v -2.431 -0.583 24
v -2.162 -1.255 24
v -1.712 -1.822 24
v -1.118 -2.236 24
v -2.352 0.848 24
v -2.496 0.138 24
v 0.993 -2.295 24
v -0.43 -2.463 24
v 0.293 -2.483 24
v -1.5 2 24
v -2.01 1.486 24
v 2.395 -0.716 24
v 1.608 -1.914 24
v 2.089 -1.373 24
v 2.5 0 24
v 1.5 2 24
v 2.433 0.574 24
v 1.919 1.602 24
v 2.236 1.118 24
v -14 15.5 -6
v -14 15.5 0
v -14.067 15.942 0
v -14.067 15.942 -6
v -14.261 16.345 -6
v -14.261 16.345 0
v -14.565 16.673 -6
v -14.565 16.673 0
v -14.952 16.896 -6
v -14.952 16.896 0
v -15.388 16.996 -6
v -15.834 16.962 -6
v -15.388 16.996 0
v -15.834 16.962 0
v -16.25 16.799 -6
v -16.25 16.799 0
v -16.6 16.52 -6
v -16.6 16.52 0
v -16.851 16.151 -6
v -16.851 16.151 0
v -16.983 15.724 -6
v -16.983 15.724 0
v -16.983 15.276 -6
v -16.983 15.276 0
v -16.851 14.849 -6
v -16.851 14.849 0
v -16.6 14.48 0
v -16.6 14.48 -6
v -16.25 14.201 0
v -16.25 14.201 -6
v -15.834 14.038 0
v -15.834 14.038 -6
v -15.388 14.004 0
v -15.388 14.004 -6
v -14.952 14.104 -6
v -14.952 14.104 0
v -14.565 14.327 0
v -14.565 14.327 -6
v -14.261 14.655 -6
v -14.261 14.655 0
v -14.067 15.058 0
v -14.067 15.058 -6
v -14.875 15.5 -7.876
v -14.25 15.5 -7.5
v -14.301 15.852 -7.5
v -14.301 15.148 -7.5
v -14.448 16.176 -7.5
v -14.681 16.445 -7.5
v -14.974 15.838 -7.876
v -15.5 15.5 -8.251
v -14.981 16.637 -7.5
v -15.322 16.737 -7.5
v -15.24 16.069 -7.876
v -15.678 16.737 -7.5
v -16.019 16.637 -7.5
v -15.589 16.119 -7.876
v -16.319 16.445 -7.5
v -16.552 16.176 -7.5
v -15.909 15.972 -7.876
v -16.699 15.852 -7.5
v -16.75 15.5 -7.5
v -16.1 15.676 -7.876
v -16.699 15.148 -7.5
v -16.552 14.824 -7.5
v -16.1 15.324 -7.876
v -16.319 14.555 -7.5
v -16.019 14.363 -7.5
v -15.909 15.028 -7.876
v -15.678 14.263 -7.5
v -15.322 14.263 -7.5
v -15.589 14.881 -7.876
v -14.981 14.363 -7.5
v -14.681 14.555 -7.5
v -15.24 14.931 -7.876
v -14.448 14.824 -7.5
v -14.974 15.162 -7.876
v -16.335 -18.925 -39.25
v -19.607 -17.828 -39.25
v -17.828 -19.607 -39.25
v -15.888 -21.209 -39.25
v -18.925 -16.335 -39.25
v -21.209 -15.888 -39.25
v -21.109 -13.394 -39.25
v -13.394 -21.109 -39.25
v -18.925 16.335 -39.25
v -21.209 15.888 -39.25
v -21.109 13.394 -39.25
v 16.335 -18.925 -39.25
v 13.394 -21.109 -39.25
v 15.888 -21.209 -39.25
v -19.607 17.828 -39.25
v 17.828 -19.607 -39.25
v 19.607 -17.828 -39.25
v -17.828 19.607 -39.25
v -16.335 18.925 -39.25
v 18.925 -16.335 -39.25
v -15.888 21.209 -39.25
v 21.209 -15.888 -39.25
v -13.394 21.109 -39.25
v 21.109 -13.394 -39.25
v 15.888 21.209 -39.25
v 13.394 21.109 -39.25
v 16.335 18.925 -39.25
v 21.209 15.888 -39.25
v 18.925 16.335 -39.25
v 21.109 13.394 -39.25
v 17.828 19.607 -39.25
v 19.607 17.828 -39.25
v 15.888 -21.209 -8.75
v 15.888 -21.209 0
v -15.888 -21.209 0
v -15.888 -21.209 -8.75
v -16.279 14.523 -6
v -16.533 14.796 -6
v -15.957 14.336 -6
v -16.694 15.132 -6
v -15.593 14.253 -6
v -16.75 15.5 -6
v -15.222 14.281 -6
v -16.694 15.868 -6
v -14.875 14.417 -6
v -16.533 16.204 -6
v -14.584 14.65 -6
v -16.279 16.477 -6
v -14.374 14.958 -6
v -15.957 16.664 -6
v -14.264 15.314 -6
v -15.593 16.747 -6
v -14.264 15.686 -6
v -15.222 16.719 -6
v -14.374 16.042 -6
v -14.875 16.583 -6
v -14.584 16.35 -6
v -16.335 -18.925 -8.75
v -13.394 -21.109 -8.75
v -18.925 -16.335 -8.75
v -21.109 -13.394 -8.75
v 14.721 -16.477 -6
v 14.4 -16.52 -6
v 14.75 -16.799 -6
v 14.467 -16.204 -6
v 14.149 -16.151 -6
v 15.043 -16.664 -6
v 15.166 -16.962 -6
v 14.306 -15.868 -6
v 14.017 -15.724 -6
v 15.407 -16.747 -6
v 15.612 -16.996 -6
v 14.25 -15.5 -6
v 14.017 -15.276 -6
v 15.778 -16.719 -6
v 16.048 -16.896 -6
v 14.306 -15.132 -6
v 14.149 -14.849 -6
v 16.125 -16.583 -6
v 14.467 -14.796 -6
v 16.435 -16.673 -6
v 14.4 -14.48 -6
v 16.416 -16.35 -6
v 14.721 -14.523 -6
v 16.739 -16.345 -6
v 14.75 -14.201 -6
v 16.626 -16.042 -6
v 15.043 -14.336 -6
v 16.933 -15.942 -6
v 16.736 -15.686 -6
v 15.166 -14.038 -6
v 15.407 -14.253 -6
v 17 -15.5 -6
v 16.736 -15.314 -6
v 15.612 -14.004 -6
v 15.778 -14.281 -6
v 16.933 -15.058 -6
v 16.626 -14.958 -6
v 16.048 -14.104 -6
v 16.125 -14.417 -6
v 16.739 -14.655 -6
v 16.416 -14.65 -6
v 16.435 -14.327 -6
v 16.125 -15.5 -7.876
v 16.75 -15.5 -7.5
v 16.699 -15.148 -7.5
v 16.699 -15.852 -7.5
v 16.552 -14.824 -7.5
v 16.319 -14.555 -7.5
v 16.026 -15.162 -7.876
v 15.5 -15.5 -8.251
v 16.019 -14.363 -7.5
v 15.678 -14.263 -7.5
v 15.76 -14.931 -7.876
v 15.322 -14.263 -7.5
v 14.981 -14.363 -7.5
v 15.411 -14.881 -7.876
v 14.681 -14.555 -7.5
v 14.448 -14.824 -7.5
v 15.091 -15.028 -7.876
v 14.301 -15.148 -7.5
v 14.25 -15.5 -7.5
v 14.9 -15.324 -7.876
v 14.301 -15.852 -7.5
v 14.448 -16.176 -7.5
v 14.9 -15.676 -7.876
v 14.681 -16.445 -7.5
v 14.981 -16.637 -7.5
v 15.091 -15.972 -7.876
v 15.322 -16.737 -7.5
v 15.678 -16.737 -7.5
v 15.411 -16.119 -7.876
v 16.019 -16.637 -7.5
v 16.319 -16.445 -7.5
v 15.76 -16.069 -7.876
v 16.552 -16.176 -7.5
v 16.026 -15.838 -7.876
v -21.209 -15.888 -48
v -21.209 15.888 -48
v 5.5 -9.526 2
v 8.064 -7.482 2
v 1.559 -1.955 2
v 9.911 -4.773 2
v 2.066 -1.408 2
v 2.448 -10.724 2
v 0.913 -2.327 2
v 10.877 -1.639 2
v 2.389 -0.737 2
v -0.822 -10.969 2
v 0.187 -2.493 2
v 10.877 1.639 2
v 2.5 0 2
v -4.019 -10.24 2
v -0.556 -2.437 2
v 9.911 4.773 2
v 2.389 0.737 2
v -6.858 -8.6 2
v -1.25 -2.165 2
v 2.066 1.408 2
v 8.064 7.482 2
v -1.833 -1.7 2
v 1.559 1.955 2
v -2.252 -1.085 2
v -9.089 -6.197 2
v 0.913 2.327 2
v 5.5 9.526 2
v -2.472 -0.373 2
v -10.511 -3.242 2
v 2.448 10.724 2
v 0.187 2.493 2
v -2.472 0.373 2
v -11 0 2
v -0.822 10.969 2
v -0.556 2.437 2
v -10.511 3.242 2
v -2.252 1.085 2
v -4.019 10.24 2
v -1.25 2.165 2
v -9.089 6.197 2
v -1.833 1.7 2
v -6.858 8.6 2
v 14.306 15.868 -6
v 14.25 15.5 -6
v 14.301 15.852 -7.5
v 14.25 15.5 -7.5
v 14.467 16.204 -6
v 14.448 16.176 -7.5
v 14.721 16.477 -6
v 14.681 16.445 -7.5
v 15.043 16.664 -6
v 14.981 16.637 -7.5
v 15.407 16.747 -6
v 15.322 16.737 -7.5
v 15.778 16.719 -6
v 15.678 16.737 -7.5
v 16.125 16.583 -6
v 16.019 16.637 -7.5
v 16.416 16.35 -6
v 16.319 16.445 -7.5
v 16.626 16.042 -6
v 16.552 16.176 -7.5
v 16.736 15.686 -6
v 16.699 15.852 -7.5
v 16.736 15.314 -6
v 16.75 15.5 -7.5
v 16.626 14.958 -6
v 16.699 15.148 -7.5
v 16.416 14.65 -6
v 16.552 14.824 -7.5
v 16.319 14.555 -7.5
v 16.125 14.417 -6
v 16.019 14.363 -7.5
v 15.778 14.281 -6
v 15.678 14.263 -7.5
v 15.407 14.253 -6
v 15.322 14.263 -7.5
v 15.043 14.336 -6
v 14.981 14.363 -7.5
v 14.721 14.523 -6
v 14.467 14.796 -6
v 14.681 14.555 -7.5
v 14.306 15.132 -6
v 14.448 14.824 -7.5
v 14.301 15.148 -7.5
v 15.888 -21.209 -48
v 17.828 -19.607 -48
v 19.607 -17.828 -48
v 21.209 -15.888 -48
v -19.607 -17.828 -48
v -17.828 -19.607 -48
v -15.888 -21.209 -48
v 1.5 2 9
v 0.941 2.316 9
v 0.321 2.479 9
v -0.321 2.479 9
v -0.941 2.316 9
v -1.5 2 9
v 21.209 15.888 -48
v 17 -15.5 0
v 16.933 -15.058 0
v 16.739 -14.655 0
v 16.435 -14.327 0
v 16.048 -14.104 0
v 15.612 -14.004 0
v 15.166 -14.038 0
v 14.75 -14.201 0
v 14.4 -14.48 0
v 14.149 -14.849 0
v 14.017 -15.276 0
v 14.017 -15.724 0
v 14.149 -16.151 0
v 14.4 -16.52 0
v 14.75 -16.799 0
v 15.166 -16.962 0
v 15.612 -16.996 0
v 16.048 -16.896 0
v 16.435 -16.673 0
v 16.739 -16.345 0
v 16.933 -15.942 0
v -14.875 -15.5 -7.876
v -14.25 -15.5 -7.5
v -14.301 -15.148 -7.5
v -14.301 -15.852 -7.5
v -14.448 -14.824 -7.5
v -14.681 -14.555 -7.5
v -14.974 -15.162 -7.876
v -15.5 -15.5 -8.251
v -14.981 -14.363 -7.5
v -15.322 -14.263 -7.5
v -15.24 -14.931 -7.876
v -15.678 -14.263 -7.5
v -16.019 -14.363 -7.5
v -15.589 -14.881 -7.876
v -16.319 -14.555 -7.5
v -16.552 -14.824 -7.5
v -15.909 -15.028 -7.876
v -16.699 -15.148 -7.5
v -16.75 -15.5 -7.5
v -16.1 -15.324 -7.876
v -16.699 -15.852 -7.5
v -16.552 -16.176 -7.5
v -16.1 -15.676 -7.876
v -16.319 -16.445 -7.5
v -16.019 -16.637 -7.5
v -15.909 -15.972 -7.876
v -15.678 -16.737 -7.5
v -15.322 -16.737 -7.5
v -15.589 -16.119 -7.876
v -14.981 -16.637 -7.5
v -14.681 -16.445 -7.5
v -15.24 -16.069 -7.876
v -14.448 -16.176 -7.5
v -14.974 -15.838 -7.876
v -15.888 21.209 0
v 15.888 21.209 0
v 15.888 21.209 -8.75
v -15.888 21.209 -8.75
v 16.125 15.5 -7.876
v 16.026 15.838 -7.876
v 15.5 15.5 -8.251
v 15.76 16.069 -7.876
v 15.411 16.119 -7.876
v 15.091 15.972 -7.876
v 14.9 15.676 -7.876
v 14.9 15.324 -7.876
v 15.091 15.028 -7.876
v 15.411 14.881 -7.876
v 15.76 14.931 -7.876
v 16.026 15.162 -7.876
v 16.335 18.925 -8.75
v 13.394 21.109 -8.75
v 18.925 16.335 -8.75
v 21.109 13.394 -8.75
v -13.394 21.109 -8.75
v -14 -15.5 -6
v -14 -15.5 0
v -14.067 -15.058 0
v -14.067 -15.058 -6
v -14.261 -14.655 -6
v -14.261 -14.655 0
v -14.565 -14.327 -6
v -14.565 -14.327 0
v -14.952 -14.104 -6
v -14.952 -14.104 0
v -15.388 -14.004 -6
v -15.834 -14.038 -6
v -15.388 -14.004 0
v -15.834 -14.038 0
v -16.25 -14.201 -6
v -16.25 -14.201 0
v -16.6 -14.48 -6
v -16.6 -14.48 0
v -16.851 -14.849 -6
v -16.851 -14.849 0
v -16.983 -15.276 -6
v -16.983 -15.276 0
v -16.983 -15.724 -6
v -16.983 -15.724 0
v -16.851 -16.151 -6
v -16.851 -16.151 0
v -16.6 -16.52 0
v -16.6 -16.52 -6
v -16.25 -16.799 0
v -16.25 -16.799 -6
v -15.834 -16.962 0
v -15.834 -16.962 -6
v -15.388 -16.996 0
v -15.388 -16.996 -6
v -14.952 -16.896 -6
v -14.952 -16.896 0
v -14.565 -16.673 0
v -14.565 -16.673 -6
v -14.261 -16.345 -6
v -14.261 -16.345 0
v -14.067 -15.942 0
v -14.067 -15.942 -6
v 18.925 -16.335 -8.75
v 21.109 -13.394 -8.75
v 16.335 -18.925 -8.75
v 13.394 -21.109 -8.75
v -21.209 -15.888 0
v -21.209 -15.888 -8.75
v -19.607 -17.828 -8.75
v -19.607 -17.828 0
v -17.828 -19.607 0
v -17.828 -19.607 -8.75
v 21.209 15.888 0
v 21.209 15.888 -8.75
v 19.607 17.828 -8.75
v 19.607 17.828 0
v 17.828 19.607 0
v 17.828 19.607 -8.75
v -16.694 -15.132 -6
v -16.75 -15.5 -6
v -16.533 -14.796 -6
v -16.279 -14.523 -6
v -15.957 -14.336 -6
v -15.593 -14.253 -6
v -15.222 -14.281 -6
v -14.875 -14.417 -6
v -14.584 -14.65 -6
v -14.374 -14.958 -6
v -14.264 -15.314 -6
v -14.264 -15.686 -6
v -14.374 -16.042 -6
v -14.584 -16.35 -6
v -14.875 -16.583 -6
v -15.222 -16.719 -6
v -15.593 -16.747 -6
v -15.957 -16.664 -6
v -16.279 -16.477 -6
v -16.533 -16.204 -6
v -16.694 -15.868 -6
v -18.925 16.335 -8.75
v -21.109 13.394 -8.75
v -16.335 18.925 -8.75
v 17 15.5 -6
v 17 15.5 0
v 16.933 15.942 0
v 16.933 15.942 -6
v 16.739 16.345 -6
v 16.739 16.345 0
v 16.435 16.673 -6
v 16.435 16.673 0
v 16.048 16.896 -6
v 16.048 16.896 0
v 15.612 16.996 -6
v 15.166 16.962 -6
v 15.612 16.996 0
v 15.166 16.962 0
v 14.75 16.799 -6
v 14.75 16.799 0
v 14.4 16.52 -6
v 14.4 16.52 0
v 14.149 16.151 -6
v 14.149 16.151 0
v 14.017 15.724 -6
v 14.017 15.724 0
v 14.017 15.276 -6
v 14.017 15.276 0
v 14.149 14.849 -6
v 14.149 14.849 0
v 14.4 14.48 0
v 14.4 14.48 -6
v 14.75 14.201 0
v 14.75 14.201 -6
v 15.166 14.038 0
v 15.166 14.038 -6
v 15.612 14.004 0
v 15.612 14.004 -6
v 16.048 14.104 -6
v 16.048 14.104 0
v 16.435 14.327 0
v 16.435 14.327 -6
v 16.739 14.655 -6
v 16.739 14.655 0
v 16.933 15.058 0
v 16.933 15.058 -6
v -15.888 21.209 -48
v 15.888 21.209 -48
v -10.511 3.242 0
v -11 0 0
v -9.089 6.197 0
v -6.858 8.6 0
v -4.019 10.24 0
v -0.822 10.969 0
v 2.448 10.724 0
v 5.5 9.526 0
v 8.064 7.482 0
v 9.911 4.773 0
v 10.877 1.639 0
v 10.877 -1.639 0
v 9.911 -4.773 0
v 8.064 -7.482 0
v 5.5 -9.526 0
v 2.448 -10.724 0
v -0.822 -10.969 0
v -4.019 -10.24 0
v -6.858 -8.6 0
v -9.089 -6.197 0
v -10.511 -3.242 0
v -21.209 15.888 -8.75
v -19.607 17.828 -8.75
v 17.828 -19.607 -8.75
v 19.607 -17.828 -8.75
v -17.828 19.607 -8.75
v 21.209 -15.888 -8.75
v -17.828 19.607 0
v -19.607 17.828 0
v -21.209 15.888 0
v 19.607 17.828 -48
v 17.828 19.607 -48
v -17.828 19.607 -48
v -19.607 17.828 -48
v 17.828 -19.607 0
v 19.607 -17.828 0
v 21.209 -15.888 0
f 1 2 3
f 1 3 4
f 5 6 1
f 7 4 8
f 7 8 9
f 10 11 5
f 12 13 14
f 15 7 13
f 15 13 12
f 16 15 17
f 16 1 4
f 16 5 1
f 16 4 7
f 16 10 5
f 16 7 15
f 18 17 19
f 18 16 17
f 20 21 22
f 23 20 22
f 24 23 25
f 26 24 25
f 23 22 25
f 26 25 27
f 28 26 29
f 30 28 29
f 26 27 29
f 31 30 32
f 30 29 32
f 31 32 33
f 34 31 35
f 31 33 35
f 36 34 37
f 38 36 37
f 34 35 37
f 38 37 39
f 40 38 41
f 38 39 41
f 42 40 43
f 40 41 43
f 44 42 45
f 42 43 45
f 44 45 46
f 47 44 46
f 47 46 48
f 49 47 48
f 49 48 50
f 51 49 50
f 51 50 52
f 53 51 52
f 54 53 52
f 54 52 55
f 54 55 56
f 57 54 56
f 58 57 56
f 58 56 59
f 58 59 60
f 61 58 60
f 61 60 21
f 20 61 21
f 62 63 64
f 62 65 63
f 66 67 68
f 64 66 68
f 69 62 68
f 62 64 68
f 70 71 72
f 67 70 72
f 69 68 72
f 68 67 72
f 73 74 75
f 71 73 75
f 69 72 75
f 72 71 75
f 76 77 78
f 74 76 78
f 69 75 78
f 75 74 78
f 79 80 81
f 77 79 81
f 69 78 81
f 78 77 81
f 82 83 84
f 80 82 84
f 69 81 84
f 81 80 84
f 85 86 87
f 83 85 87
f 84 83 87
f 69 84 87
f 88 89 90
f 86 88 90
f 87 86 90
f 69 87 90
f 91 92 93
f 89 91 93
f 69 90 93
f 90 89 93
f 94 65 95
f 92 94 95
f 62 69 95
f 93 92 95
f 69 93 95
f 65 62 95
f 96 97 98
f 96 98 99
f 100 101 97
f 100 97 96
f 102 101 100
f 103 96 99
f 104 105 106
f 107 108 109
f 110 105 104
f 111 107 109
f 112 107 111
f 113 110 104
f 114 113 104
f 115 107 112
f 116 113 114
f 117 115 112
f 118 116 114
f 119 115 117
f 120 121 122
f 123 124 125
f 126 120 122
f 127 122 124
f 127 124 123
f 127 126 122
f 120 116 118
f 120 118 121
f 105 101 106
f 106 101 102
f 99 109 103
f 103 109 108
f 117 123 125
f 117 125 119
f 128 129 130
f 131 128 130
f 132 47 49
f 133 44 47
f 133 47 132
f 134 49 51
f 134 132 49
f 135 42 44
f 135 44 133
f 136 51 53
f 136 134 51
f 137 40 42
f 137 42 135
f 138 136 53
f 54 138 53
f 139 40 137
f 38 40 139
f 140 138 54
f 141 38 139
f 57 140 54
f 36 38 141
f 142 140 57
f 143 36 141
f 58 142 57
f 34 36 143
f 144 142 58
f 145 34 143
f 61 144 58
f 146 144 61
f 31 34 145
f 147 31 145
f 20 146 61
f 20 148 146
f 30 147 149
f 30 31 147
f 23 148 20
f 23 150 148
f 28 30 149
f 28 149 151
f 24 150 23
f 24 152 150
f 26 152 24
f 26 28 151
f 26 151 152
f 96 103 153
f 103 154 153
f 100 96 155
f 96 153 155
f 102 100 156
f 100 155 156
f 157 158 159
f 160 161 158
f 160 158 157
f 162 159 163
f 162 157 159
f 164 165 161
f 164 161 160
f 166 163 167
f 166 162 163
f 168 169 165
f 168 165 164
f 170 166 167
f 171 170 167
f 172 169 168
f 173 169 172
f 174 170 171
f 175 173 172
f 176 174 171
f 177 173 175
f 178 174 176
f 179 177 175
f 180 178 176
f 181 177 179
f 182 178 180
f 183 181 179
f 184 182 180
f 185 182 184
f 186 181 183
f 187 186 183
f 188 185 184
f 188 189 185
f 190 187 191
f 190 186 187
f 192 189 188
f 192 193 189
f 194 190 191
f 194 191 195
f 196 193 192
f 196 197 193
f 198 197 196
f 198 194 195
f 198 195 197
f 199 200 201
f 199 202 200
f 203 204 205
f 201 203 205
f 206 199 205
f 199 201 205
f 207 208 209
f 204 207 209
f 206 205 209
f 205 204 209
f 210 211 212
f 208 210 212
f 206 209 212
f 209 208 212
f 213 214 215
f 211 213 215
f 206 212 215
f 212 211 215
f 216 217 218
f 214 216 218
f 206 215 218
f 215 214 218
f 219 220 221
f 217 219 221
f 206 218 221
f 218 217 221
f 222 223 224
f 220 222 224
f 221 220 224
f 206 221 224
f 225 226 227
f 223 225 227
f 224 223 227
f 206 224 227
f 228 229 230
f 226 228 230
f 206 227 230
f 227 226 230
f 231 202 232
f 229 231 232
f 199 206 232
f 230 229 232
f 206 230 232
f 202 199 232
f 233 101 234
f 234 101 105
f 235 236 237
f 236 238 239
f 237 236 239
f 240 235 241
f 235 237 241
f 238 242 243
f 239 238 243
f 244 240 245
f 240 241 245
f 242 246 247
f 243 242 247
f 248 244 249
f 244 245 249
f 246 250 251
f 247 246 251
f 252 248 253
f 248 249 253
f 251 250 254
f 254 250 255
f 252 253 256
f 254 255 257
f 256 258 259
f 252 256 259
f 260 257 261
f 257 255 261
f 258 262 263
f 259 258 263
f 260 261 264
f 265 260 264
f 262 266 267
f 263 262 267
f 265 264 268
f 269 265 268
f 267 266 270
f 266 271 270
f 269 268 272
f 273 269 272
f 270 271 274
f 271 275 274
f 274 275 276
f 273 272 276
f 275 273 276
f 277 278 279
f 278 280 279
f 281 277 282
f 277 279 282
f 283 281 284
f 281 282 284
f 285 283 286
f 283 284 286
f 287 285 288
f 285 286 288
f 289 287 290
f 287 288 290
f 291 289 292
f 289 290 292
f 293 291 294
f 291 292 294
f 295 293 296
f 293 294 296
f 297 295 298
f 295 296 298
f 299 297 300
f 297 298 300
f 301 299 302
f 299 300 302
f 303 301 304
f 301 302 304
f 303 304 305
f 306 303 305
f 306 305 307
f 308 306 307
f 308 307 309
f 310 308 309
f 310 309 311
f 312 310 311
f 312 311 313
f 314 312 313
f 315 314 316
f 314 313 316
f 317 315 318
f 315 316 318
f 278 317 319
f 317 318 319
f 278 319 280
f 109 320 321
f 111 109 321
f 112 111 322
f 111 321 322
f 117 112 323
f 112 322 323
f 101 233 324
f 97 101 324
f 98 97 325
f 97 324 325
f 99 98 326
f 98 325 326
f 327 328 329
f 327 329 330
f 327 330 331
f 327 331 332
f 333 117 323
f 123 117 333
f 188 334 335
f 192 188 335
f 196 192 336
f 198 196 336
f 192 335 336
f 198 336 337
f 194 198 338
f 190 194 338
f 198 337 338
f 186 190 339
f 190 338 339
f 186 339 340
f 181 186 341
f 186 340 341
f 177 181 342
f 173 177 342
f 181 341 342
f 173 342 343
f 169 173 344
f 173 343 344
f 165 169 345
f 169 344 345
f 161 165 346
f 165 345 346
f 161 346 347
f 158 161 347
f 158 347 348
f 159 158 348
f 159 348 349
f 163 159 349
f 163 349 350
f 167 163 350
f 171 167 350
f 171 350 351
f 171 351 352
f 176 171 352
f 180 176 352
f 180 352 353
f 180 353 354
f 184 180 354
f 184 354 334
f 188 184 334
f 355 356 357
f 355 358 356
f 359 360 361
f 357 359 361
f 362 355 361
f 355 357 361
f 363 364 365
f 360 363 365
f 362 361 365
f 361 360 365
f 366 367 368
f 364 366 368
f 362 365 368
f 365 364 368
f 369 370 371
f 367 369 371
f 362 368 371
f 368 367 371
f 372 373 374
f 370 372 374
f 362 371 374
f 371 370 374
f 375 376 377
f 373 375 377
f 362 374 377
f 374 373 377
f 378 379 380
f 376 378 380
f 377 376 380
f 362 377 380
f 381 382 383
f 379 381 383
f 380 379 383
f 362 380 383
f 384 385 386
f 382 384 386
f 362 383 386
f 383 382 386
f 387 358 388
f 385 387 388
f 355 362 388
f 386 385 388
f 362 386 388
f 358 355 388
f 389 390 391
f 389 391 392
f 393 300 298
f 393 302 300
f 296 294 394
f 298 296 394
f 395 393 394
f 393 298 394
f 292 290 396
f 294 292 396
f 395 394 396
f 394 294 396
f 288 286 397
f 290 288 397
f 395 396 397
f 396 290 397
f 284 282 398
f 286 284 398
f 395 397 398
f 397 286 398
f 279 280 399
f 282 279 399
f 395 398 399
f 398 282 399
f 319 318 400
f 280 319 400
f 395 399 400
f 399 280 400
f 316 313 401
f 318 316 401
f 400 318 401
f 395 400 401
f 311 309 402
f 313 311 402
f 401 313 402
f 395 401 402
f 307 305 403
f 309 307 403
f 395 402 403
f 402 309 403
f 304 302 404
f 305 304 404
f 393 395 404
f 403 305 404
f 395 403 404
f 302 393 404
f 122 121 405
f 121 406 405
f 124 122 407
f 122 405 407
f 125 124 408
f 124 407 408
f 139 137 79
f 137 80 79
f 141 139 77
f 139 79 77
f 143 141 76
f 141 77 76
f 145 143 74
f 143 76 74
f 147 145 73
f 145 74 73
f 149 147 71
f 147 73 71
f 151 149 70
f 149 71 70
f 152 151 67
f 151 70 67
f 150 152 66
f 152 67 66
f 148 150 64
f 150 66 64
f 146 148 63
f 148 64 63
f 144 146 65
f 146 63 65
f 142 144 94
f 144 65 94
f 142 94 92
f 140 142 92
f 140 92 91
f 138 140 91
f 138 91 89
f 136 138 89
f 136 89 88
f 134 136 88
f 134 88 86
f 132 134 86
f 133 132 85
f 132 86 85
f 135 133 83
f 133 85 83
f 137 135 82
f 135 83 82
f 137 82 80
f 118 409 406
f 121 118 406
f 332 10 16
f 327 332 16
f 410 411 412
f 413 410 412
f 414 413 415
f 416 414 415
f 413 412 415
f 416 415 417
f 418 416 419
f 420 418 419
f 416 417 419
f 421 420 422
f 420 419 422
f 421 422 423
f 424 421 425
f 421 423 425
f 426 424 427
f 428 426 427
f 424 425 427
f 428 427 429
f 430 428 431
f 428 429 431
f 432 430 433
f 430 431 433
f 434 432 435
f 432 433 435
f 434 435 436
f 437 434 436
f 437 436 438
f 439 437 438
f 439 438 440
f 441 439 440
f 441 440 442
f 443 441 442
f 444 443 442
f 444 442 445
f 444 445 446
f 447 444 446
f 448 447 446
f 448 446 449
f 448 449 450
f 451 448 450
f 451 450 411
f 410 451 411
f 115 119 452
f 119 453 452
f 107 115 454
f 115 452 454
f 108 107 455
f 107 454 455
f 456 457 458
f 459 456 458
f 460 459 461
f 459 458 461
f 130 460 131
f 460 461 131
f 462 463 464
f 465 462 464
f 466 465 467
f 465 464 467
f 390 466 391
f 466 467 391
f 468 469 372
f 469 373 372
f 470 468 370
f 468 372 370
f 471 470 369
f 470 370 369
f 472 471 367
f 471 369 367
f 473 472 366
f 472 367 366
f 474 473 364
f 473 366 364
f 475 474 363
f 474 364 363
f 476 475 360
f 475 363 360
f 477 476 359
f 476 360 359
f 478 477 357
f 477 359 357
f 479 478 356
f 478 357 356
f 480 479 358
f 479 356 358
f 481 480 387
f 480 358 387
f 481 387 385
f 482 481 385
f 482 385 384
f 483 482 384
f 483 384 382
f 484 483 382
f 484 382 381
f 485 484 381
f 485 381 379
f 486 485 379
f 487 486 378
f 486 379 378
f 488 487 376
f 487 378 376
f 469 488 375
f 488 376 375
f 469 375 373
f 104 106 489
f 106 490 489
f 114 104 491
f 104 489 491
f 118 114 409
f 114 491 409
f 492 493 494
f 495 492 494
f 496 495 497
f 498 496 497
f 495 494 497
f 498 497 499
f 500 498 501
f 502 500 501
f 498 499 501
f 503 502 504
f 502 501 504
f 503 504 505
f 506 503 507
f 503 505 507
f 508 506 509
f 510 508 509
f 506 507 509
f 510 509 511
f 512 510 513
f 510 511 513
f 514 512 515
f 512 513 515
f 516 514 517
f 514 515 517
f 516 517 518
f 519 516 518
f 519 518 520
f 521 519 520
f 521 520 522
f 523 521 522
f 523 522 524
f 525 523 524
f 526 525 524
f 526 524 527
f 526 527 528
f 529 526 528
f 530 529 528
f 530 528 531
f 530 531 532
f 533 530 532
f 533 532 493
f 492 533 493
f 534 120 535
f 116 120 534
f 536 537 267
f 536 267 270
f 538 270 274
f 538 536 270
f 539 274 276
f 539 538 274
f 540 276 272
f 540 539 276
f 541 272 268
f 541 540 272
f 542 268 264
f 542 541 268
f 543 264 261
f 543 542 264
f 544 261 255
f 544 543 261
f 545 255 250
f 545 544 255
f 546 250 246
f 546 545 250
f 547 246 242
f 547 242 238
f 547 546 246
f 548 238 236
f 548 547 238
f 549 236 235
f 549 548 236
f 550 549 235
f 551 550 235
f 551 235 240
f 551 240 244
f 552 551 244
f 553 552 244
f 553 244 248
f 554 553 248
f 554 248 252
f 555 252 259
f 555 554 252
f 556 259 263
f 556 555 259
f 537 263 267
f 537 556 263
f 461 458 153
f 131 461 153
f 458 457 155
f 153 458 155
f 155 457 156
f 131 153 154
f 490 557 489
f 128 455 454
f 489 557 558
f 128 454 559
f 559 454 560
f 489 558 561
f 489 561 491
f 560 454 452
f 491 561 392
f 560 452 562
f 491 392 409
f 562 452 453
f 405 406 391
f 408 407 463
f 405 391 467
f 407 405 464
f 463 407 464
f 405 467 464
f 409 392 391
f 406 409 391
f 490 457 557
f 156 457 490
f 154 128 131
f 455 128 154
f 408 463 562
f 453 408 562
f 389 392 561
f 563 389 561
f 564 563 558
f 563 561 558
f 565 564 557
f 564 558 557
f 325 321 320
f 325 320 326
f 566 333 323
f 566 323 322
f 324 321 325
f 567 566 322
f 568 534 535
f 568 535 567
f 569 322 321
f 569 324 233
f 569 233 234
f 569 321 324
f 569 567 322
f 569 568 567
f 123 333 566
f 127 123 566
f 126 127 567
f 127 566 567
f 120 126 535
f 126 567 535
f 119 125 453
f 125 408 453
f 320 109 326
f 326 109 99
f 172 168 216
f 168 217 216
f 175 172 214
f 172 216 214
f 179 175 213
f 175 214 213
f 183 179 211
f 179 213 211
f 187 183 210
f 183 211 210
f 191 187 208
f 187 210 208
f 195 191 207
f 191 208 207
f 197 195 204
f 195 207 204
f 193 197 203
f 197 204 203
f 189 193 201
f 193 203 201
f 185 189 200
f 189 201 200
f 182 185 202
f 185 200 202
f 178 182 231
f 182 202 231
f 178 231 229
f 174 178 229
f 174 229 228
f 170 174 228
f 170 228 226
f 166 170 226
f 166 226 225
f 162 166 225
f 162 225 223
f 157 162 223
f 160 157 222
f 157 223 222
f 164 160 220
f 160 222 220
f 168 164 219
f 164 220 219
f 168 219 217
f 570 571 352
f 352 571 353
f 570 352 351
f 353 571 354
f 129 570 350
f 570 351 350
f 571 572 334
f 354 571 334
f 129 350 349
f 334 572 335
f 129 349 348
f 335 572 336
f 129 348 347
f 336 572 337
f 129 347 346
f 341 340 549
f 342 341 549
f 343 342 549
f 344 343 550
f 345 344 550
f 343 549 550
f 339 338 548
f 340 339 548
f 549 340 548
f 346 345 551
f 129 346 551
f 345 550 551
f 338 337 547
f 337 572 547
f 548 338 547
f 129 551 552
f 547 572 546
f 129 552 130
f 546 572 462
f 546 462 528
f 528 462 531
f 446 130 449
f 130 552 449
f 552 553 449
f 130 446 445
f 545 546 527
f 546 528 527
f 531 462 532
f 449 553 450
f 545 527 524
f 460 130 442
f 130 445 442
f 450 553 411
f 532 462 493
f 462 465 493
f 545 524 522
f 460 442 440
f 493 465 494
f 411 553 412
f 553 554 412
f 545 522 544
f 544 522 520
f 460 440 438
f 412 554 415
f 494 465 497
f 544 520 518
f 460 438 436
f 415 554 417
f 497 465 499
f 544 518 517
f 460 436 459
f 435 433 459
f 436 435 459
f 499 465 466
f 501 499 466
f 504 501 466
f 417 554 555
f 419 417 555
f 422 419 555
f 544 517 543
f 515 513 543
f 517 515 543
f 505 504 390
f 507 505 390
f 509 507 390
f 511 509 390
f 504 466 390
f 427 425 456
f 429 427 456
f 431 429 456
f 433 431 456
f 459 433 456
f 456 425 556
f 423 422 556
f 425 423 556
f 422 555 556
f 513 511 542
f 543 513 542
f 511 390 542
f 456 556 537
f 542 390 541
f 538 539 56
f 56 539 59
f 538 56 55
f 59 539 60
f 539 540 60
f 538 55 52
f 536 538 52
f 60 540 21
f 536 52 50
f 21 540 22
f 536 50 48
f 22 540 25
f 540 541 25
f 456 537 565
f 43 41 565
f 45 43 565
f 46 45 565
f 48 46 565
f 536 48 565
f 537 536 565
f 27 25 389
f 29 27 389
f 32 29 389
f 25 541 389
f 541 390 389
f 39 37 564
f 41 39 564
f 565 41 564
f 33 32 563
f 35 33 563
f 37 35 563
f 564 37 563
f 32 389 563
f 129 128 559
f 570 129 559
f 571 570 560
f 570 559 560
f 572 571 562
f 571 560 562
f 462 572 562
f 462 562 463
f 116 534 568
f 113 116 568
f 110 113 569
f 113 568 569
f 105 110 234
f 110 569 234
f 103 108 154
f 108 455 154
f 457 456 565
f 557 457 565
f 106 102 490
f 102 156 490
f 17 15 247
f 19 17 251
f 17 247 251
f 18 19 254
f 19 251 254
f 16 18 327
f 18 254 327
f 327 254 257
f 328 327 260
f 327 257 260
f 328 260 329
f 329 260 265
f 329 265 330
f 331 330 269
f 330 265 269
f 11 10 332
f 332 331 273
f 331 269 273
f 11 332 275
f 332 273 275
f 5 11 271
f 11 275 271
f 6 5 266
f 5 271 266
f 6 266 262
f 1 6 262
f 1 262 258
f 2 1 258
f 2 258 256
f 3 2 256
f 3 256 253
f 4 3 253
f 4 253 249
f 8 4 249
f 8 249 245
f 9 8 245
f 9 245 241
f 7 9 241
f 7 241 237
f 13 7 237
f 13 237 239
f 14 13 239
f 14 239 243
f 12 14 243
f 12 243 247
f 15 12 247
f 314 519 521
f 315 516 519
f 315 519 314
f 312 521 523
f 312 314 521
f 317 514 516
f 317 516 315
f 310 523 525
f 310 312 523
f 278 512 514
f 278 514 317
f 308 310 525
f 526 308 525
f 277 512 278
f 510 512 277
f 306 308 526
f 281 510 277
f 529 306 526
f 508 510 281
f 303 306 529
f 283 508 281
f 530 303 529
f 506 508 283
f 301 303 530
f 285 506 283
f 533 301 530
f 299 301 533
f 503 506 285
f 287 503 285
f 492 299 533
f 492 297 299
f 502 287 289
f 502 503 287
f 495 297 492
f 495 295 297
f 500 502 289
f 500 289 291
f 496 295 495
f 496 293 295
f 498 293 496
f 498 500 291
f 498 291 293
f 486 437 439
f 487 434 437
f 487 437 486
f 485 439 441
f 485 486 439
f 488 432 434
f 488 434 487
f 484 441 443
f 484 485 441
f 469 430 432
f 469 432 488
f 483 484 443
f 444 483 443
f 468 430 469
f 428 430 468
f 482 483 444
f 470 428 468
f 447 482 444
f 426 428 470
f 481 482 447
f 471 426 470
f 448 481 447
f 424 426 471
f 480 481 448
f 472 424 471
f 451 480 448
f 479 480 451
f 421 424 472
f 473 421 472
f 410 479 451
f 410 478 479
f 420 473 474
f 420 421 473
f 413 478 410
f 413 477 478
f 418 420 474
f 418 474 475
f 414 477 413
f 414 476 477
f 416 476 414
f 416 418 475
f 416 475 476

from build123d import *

# Parameters (mm, degrees)
SKETCH1_R                       = 2.5
BOSS_EXTRUDE1_DEPTH             = 24
SKETCH2_R                       = 11
BOSS_EXTRUDE2_DEPTH             = 2
SKETCH3_W                       = 42.418
SKETCH3_H                       = 42.418
BOSS_EXTRUDE3_DEPTH             = 48
CUT_EXTRUDE1_DEPTH              = 73
M3X0_5_TAPPED_HOLE1_D           = 2.5
M3X0_5_TAPPED_HOLE1_DEPTH       = 7.5
M3X0_5_TAPPED_HOLE1_CBORE_D     = 3
M3X0_5_TAPPED_HOLE1_CBORE_DEPTH = 6
M3X0_5_TAPPED_HOLE1_TIP         = 0.751075774
CUT_EXTRUDE2_DEPTH              = 15
CUT_EXTRUDE3_DEPTH              = 15.25


with BuildPart() as part:
    # Sketch1 → Boss-Extrude1 (new body)
    with BuildSketch(Plane.XY):
        Circle(SKETCH1_R)
    extrude(amount=BOSS_EXTRUDE1_DEPTH)

    # Sketch2 → Boss-Extrude2 (add)
    with BuildSketch(Plane(origin=(0, 0, 0), x_dir=(-1, 0, 0), z_dir=(0, 0, -1))):
        Circle(SKETCH2_R)
    extrude(amount=-BOSS_EXTRUDE2_DEPTH)

    # Sketch3 → Boss-Extrude3 (add)
    with BuildSketch(Plane(origin=(0, 0, 0), x_dir=(-1, 0, 0), z_dir=(0, 0, -1))):
        Rectangle(SKETCH3_W, SKETCH3_H)
    extrude(amount=BOSS_EXTRUDE3_DEPTH)

    # Sketch4 → Cut-Extrude1 (cut, through all)
    with BuildSketch(Plane(origin=(0, 0, -48), x_dir=(-1, 0, 0), z_dir=(0, 0, -1))):
        with BuildLine():
            Line((-21.209, -15.887992919), (-21.209, -21.209))
            Line((-21.209, -21.209), (-15.887992919, -21.209))
            ThreePointArc((-15.887992919, -21.209), (-18.738329701, -18.738329701), (-21.209, -15.887992919))
        make_face()
        with BuildLine():
            Line((15.887992919, -21.209), (21.209, -21.209))
            Line((21.209, -21.209), (21.209, -15.887992919))
            ThreePointArc((21.209, -15.887992919), (18.738329701, -18.738329701), (15.887992919, -21.209))
        make_face()
        with BuildLine():
            Line((21.209, 15.887992919), (21.209, 21.209))
            Line((21.209, 21.209), (15.887992919, 21.209))
            ThreePointArc((15.887992919, 21.209), (18.738329701, 18.738329701), (21.209, 15.887992919))
        make_face()
        with BuildLine():
            Line((-15.887992919, 21.209), (-21.209, 21.209))
            Line((-21.209, 21.209), (-21.209, 15.887992919))
            ThreePointArc((-21.209, 15.887992919), (-18.738329701, 18.738329701), (-15.887992919, 21.209))
        make_face()
    extrude(amount=-CUT_EXTRUDE1_DEPTH, mode=Mode.SUBTRACT)

    # M3x0.5 Tapped Hole1
    with Locations(Plane.XY):
        with Locations((-15.5, 15.5), (-15.5, -15.5), (15.5, -15.5), (15.5, 15.5)):
            CounterBoreHole(M3X0_5_TAPPED_HOLE1_D / 2, M3X0_5_TAPPED_HOLE1_CBORE_D / 2, M3X0_5_TAPPED_HOLE1_CBORE_DEPTH, depth=M3X0_5_TAPPED_HOLE1_DEPTH)
            with Locations((0, 0, -(M3X0_5_TAPPED_HOLE1_DEPTH + M3X0_5_TAPPED_HOLE1_TIP / 2))):  # 118° drill point
                Cone(0, M3X0_5_TAPPED_HOLE1_D / 2, M3X0_5_TAPPED_HOLE1_TIP, mode=Mode.SUBTRACT)

    # Sketch7 → Cut-Extrude2 (cut)
    with BuildSketch(Plane.XY.offset(24)):
        with BuildLine():
            Line((-1.5, 2), (1.5, 2))
            ThreePointArc((1.5, 2), (0, 2.5), (-1.5, 2))
        make_face()
    extrude(amount=-CUT_EXTRUDE2_DEPTH, mode=Mode.SUBTRACT)

    # Sketch8 → Cut-Extrude3 (cut, symmetric)
    with BuildSketch(Plane.XY.offset(-24)):
        with BuildLine():
            Line((15.887992919, 21.209), (-15.887992919, 21.209))
            ThreePointArc((-15.887992919, 21.209), (-18.738329701, 18.738329701), (-21.209, 15.887992919))
            Line((-21.209, 15.887992919), (-21.209, -15.887992919))
            ThreePointArc((-21.209, -15.887992919), (-18.738329701, -18.738329701), (-15.887992919, -21.209))
            Line((-15.887992919, -21.209), (15.887992919, -21.209))
            ThreePointArc((15.887992919, -21.209), (18.738329701, -18.738329701), (21.209, -15.887992919))
            Line((21.209, -15.887992919), (21.209, 15.887992919))
            ThreePointArc((21.209, 15.887992919), (18.738329701, 18.738329701), (15.887992919, 21.209))
        make_face()
        with BuildLine():
            Line((-13.394406258, 21.109), (13.394406258, 21.109))
            ThreePointArc((13.394406258, 21.109), (17.67766953, 17.67766953), (21.109, 13.394406258))
            Line((21.109, 13.394406258), (21.109, -13.394406258))
            ThreePointArc((21.109, -13.394406258), (17.67766953, -17.67766953), (13.394406258, -21.109))
            Line((13.394406258, -21.109), (-13.394406258, -21.109))
            ThreePointArc((-13.394406258, -21.109), (-17.67766953, -17.67766953), (-21.109, -13.394406258))
            Line((-21.109, -13.394406258), (-21.109, 13.394406258))
            ThreePointArc((-21.109, 13.394406258), (-17.67766953, 17.67766953), (-13.394406258, 21.109))
        make_face(mode=Mode.SUBTRACT)
    extrude(amount=CUT_EXTRUDE3_DEPTH, both=True, mode=Mode.SUBTRACT)


solid = part.part
